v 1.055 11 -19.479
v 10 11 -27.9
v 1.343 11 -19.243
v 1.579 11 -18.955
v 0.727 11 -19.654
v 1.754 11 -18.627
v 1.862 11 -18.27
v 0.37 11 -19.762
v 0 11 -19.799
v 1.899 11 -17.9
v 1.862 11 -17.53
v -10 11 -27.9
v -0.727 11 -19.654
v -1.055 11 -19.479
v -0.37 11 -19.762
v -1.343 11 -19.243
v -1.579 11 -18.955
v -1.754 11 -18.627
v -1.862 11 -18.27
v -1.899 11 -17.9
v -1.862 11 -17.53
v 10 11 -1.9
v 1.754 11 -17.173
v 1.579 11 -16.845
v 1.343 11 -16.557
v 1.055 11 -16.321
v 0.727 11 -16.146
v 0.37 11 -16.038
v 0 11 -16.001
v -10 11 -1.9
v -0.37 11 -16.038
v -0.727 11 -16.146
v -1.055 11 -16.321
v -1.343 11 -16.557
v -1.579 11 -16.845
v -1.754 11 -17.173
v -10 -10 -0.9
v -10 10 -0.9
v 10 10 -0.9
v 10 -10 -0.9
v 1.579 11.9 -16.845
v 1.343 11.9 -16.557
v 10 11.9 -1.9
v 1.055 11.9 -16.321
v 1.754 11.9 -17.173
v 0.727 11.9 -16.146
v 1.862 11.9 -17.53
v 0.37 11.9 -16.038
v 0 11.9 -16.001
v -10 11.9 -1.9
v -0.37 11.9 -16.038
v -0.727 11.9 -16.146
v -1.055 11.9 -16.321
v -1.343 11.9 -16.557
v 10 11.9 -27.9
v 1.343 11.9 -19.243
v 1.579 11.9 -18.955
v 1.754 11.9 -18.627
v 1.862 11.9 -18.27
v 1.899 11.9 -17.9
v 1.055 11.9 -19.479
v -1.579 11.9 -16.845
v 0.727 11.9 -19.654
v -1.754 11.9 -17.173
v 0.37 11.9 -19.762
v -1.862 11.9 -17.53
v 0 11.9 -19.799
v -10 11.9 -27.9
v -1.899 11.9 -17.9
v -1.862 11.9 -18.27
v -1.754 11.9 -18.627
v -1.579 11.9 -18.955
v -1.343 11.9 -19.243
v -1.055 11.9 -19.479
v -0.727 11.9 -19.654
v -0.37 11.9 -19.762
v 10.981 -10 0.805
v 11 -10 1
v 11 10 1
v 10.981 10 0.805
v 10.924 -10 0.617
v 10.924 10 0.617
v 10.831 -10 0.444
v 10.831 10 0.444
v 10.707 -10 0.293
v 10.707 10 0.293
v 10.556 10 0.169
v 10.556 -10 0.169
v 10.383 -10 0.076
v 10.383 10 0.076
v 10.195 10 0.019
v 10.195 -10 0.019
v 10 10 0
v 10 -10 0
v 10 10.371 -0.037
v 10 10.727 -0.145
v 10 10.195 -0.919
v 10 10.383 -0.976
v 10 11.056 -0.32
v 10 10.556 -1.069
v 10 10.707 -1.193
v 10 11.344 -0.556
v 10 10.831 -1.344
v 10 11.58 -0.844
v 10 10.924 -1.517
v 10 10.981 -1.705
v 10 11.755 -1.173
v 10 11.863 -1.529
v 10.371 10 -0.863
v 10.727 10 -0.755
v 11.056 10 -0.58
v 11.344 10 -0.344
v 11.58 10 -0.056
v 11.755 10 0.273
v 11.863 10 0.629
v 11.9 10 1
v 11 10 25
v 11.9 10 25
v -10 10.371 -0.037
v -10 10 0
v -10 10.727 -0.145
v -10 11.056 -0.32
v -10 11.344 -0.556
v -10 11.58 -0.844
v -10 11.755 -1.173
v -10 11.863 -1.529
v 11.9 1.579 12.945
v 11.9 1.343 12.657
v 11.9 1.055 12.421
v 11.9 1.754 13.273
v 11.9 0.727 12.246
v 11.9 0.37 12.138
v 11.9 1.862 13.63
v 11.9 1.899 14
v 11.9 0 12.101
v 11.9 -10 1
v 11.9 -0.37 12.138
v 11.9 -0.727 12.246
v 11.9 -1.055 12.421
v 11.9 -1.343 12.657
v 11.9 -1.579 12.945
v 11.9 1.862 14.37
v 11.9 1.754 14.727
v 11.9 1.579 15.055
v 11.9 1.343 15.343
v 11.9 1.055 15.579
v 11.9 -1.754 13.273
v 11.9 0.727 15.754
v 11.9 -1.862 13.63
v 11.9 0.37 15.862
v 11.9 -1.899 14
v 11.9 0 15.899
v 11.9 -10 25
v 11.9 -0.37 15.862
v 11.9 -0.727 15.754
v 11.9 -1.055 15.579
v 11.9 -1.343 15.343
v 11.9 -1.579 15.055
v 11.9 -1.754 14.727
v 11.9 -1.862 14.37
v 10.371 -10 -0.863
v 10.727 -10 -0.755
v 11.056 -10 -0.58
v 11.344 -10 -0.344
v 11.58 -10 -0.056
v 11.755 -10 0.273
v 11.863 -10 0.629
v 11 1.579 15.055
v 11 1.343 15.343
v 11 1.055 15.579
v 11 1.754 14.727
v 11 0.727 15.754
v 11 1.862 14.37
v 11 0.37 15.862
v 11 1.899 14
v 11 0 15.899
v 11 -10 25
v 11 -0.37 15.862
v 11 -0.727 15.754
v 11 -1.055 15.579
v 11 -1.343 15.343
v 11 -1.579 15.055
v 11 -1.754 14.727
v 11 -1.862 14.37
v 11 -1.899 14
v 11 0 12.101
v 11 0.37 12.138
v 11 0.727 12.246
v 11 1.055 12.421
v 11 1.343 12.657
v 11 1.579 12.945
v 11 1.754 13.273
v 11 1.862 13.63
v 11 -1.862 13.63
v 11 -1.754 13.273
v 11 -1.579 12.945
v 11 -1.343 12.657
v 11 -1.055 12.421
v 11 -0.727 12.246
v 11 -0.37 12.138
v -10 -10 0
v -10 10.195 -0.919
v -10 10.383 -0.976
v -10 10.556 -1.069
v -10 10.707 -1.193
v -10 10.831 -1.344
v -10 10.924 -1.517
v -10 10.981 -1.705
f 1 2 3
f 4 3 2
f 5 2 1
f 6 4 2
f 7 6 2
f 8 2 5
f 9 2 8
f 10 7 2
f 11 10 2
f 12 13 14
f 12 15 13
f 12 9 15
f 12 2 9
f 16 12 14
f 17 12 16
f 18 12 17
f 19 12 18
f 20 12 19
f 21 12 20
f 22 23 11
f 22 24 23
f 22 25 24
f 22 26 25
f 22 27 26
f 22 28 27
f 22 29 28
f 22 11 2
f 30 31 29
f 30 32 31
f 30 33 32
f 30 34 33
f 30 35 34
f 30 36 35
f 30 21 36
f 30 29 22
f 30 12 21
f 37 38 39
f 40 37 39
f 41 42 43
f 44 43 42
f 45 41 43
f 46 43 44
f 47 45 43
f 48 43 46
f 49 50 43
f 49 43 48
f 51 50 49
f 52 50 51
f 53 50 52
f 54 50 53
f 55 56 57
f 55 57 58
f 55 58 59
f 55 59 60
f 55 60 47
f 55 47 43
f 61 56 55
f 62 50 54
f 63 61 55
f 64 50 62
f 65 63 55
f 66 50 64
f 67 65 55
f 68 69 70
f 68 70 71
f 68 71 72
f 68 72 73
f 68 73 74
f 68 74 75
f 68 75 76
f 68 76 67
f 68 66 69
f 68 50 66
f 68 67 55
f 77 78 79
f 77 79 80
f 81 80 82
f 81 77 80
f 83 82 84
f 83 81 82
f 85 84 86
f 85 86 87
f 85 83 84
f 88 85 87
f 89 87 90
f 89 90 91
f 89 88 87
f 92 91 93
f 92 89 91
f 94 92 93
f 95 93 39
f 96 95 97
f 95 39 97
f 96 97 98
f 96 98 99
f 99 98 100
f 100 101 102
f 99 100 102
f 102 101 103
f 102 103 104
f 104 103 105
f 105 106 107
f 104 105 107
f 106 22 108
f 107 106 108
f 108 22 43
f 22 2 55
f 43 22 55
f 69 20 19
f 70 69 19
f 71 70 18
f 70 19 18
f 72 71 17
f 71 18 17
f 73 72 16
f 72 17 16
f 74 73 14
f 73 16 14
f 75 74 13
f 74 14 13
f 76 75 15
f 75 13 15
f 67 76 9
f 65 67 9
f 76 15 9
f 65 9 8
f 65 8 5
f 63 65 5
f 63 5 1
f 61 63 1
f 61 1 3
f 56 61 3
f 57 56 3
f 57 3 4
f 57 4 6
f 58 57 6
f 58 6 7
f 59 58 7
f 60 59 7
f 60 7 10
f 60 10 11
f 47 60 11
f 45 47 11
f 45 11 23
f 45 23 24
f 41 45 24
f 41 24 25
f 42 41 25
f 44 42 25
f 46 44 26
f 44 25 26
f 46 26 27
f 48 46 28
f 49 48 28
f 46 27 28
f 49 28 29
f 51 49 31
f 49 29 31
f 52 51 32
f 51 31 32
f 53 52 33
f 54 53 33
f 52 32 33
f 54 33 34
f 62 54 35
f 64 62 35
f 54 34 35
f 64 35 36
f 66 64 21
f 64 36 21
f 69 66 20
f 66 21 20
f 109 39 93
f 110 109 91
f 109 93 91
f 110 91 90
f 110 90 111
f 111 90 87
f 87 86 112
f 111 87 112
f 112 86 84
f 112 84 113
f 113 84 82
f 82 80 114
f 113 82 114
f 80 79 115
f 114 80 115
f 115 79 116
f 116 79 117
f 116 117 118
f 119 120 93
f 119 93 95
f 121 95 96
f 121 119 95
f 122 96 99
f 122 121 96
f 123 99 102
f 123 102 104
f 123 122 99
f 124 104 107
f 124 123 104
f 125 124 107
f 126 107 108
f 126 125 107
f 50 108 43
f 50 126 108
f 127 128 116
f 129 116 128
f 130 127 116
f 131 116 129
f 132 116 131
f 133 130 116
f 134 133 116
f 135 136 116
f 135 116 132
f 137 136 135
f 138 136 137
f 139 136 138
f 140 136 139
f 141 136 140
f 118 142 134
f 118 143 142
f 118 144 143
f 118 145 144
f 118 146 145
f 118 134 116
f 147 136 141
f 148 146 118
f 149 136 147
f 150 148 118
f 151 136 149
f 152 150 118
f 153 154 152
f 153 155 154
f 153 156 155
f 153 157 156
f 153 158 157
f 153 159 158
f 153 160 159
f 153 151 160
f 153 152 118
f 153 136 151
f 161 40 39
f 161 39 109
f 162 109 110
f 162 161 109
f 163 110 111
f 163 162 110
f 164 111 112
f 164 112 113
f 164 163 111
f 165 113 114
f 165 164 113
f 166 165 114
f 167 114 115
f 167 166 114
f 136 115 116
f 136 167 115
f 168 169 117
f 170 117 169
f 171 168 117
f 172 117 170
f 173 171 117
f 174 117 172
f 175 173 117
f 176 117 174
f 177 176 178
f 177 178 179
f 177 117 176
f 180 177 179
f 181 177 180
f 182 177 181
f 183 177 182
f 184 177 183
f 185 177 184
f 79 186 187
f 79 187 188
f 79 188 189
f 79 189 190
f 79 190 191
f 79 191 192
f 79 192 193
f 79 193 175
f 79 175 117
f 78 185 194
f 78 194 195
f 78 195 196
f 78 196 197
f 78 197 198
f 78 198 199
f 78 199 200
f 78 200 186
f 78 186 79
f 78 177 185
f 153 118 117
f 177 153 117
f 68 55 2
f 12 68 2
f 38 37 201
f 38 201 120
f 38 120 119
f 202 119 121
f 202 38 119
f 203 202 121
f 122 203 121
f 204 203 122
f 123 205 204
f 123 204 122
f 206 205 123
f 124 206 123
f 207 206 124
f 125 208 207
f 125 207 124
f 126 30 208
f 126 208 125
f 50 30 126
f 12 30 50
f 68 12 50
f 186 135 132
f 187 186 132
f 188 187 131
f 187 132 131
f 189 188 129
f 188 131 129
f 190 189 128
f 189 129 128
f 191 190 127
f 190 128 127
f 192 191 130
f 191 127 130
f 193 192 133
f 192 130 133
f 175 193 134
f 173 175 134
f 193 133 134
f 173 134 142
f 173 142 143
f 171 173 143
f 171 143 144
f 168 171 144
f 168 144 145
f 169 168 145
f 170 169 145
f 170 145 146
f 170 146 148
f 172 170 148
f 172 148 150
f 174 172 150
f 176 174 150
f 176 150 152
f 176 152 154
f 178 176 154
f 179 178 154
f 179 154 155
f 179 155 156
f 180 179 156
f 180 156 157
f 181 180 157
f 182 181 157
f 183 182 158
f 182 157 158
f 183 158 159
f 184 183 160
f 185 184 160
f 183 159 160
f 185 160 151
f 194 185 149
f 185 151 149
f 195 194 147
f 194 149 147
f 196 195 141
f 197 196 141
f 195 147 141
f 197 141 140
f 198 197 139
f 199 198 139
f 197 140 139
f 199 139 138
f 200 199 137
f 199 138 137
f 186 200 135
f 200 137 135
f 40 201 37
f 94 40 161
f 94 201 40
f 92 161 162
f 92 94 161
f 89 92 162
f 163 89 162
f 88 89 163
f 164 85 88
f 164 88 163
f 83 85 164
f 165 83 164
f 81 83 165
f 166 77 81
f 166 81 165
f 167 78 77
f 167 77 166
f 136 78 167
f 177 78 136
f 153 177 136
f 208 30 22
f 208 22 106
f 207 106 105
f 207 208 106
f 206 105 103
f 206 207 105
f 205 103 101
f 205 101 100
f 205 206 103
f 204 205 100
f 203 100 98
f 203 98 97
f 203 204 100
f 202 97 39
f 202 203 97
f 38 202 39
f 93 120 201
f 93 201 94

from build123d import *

# Parameters (mm, degrees)
SKETCH1_W                    = 20
SKETCH1_H                    = 20
BASE_FLANGE1_DEPTH           = 0.9
EDGE_FLANGE2_DEPTH           = 20
F_25_0_1495_DIAMETER_SLOT2_D = 3.7973
EDGE_FLANGE4_DEPTH           = 20
F_25_0_1495_DIAMETER_SLOT5_D = 3.7973


# Sheet-metal steps are written as plain solids
with BuildPart() as part:
    # Sketch1 → Base-Flange1 (new body)
    with BuildSketch(Plane.XY):
        Rectangle(SKETCH1_W, SKETCH1_H)
    extrude(amount=-BASE_FLANGE1_DEPTH)

    # Edge-Flange2 section (across the edge) → Edge-Flange2 (add)
    with BuildSketch(Plane(origin=(-10, 11, -0.9), x_dir=(0, -1, 0), z_dir=(1, 0, 0))):
        with BuildLine():
            Line((-0.9, 1), (-0.9, 27))
            Line((-0.9, 27), (0, 27))
            Line((0, 27), (0, 1))
            ThreePointArc((0, 1), (0.292893219, 0.292893219), (1, 0))
            Line((1, 0), (1, -0.9))
            ThreePointArc((1, -0.9), (-0.343502884, -0.343502884), (-0.9, 1))
        make_face()
    extrude(amount=EDGE_FLANGE2_DEPTH)

    # #25 (0.1495) Diameter Slot2 (through all)
    with Locations(Plane(origin=(0, 11.9, 0), x_dir=(1, 0, 0), z_dir=(0, 1, 0))):
        with Locations((0, 17.9)):
            Hole(F_25_0_1495_DIAMETER_SLOT2_D / 2)

    # Edge-Flange4 section (across the edge) → Edge-Flange4 (add)
    with BuildSketch(Plane(origin=(11, -10, 0), x_dir=(-1, 0, 0), z_dir=(0, 1, 0))):
        with BuildLine():
            Line((-0.9, 1), (-0.9, 25))
            Line((-0.9, 25), (0, 25))
            Line((0, 25), (0, 1))
            ThreePointArc((0, 1), (0.292893219, 0.292893219), (1, 0))
            Line((1, 0), (1, -0.9))
            ThreePointArc((1, -0.9), (-0.343502884, -0.343502884), (-0.9, 1))
        make_face()
    extrude(amount=EDGE_FLANGE4_DEPTH)

    # #25 (0.1495) Diameter Slot5 (through all)
    with Locations(Plane.ZY.offset(-11)):
        with Locations((14, 0)):
            Hole(F_25_0_1495_DIAMETER_SLOT5_D / 2)


solid = part.part
